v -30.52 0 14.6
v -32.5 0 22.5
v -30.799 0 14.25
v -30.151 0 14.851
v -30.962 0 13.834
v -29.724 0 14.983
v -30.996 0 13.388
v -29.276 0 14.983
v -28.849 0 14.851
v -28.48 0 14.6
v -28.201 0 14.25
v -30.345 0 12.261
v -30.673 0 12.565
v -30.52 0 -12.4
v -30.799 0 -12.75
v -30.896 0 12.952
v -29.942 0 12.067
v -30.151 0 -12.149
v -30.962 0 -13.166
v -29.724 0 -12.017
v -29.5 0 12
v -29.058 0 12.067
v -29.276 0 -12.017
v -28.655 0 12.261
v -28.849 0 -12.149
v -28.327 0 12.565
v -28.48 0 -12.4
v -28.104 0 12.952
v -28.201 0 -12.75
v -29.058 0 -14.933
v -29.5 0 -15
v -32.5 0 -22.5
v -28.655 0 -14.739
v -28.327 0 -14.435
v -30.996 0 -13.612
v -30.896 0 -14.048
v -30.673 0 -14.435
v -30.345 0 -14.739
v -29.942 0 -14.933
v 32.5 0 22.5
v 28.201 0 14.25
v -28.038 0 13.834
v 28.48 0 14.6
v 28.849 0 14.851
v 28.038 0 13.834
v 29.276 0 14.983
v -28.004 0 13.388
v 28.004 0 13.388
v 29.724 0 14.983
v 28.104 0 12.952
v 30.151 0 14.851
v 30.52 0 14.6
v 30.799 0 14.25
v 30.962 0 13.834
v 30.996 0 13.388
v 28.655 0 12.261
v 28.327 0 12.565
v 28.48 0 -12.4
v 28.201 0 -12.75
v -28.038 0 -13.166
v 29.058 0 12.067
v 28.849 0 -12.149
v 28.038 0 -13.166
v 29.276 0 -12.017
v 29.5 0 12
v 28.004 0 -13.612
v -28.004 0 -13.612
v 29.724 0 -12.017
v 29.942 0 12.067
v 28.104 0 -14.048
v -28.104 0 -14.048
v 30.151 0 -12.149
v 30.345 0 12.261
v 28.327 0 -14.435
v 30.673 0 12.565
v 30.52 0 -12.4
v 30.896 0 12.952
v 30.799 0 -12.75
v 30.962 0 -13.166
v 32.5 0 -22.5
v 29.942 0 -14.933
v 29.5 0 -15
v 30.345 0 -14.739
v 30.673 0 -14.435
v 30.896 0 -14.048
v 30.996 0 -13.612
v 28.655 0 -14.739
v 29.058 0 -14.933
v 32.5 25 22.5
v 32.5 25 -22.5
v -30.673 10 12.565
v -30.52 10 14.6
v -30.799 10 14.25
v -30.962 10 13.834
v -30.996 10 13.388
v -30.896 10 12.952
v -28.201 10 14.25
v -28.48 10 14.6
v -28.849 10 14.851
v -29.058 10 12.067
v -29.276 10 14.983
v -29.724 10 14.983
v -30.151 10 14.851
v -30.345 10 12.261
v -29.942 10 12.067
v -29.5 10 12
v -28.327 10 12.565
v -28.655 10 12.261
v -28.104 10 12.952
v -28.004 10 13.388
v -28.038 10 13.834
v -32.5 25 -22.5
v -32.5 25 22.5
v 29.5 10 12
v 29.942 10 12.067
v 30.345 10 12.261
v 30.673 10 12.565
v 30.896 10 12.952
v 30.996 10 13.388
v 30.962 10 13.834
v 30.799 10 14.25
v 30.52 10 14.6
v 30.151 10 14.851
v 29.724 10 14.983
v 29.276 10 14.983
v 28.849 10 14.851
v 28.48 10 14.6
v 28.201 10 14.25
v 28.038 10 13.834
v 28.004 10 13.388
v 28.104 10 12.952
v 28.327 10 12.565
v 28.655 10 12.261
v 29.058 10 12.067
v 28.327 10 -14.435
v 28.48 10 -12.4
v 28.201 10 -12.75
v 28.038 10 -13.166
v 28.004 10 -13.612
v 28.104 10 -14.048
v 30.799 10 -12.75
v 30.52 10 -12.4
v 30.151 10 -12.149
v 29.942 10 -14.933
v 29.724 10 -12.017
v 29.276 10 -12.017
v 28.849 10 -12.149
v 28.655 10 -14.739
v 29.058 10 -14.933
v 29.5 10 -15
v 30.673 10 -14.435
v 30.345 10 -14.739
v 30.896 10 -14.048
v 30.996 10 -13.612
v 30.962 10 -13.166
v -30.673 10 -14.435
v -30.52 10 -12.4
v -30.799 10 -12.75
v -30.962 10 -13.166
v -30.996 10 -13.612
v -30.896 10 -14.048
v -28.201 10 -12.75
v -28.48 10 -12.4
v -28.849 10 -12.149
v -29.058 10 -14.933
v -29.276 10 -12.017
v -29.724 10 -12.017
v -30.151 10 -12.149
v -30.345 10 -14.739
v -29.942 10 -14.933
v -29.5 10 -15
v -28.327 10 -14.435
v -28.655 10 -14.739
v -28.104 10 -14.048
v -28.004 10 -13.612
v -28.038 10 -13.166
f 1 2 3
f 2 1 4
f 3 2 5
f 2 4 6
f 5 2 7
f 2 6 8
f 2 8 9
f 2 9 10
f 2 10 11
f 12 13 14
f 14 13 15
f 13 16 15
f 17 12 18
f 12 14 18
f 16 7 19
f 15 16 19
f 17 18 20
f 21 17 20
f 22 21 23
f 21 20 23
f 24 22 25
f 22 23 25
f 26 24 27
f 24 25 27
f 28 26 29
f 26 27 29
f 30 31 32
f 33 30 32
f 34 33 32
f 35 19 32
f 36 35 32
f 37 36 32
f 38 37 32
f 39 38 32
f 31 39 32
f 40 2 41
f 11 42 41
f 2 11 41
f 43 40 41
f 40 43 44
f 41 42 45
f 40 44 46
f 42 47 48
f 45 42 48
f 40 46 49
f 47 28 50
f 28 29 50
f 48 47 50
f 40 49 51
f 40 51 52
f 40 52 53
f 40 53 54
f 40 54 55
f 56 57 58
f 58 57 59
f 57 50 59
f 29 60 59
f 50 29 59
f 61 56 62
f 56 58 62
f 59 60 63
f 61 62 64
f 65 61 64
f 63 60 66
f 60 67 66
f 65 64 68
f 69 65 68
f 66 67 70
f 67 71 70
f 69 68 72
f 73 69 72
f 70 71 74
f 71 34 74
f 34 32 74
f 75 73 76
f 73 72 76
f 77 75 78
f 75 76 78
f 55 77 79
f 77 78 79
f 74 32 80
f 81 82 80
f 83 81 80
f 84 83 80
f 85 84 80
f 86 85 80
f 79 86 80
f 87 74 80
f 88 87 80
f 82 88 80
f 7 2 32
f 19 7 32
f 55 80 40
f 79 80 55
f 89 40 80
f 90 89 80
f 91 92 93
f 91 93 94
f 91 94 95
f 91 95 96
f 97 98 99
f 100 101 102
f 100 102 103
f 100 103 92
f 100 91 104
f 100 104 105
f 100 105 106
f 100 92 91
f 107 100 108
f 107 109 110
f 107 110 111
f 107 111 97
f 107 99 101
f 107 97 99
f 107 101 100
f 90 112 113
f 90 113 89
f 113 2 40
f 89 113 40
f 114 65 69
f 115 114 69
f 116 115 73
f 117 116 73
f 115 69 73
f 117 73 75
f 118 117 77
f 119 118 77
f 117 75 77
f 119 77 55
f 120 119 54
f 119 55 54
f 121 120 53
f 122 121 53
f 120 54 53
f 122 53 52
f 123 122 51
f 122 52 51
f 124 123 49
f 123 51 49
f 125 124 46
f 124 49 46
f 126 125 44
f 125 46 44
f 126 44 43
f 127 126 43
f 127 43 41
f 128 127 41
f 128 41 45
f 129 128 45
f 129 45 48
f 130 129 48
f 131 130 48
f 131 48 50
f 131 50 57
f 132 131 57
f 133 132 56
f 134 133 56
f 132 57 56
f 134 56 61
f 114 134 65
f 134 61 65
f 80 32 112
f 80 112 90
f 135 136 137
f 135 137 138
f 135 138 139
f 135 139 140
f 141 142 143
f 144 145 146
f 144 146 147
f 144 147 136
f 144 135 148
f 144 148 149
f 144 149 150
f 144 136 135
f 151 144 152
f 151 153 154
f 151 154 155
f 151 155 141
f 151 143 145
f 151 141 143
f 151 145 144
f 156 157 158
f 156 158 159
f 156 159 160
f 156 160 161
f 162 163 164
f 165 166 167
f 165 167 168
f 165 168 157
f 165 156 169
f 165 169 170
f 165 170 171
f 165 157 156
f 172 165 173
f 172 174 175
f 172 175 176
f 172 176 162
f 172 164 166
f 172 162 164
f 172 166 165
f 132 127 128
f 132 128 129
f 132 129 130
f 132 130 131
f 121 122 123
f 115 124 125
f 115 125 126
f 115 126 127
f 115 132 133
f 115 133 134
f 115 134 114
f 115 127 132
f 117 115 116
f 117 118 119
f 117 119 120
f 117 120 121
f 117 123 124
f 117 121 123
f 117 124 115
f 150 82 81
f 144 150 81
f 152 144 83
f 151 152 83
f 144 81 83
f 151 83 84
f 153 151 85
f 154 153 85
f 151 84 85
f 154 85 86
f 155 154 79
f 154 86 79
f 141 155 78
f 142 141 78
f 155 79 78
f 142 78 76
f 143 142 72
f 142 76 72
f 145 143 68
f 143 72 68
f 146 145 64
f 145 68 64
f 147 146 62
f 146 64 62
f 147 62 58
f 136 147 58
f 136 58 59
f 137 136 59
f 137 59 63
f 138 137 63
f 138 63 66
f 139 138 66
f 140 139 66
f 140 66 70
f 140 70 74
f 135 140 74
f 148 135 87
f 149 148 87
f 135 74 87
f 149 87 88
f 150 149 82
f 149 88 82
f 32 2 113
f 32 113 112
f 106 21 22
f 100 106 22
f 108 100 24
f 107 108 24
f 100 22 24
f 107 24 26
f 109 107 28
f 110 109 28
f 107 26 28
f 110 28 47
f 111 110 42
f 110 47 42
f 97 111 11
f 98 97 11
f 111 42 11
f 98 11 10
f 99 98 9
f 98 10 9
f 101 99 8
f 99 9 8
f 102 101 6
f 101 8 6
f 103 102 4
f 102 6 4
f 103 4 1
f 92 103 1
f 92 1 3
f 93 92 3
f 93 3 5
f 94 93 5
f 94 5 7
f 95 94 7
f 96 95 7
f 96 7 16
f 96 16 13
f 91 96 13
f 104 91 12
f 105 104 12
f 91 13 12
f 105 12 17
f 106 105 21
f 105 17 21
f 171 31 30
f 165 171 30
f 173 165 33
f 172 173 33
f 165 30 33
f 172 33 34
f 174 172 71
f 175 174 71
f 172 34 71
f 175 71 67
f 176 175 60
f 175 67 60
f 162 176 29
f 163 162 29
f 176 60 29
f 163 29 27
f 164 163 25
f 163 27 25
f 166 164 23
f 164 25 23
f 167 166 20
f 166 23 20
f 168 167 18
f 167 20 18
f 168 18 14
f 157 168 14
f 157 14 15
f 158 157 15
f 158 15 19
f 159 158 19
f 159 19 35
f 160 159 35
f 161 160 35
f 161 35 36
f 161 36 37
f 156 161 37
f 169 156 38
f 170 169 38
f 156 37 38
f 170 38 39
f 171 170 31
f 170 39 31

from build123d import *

# Parameters (mm, degrees)
SKETCH_1_W          = 65
SKETCH_1_H          = 45
EXTRUDE_1_DEPTH     = 25
SKETCH_2_R          = 1.5
CUT_EXTRUDE_1_DEPTH = 10


with BuildPart() as part:
    # Эскиз1 → Бобышка-Вытянуть1 (new body)
    with BuildSketch(Plane(origin=(0, 0, 0), x_dir=(1, 0, 0), z_dir=(0, 1, 0))):
        Rectangle(SKETCH_1_W, SKETCH_1_H)
    extrude(amount=EXTRUDE_1_DEPTH)

    # Эскиз2 → Вырез-Вытянуть1 (cut)
    with BuildSketch(Plane.XZ):
        with Locations(Location((-29.5, 13.5, 0), (0, 0, 270))):
            Circle(SKETCH_2_R)
        with Locations(Location((29.5, 13.5, 0), (0, 0, 270))):
            Circle(SKETCH_2_R)
        with Locations(Location((-29.5, -13.5, 0), (0, 0, 270))):
            Circle(SKETCH_2_R)
        with Locations(Location((29.5, -13.5, 0), (0, 0, 270))):
            Circle(SKETCH_2_R)
    extrude(amount=-CUT_EXTRUDE_1_DEPTH, mode=Mode.SUBTRACT)


solid = part.part
